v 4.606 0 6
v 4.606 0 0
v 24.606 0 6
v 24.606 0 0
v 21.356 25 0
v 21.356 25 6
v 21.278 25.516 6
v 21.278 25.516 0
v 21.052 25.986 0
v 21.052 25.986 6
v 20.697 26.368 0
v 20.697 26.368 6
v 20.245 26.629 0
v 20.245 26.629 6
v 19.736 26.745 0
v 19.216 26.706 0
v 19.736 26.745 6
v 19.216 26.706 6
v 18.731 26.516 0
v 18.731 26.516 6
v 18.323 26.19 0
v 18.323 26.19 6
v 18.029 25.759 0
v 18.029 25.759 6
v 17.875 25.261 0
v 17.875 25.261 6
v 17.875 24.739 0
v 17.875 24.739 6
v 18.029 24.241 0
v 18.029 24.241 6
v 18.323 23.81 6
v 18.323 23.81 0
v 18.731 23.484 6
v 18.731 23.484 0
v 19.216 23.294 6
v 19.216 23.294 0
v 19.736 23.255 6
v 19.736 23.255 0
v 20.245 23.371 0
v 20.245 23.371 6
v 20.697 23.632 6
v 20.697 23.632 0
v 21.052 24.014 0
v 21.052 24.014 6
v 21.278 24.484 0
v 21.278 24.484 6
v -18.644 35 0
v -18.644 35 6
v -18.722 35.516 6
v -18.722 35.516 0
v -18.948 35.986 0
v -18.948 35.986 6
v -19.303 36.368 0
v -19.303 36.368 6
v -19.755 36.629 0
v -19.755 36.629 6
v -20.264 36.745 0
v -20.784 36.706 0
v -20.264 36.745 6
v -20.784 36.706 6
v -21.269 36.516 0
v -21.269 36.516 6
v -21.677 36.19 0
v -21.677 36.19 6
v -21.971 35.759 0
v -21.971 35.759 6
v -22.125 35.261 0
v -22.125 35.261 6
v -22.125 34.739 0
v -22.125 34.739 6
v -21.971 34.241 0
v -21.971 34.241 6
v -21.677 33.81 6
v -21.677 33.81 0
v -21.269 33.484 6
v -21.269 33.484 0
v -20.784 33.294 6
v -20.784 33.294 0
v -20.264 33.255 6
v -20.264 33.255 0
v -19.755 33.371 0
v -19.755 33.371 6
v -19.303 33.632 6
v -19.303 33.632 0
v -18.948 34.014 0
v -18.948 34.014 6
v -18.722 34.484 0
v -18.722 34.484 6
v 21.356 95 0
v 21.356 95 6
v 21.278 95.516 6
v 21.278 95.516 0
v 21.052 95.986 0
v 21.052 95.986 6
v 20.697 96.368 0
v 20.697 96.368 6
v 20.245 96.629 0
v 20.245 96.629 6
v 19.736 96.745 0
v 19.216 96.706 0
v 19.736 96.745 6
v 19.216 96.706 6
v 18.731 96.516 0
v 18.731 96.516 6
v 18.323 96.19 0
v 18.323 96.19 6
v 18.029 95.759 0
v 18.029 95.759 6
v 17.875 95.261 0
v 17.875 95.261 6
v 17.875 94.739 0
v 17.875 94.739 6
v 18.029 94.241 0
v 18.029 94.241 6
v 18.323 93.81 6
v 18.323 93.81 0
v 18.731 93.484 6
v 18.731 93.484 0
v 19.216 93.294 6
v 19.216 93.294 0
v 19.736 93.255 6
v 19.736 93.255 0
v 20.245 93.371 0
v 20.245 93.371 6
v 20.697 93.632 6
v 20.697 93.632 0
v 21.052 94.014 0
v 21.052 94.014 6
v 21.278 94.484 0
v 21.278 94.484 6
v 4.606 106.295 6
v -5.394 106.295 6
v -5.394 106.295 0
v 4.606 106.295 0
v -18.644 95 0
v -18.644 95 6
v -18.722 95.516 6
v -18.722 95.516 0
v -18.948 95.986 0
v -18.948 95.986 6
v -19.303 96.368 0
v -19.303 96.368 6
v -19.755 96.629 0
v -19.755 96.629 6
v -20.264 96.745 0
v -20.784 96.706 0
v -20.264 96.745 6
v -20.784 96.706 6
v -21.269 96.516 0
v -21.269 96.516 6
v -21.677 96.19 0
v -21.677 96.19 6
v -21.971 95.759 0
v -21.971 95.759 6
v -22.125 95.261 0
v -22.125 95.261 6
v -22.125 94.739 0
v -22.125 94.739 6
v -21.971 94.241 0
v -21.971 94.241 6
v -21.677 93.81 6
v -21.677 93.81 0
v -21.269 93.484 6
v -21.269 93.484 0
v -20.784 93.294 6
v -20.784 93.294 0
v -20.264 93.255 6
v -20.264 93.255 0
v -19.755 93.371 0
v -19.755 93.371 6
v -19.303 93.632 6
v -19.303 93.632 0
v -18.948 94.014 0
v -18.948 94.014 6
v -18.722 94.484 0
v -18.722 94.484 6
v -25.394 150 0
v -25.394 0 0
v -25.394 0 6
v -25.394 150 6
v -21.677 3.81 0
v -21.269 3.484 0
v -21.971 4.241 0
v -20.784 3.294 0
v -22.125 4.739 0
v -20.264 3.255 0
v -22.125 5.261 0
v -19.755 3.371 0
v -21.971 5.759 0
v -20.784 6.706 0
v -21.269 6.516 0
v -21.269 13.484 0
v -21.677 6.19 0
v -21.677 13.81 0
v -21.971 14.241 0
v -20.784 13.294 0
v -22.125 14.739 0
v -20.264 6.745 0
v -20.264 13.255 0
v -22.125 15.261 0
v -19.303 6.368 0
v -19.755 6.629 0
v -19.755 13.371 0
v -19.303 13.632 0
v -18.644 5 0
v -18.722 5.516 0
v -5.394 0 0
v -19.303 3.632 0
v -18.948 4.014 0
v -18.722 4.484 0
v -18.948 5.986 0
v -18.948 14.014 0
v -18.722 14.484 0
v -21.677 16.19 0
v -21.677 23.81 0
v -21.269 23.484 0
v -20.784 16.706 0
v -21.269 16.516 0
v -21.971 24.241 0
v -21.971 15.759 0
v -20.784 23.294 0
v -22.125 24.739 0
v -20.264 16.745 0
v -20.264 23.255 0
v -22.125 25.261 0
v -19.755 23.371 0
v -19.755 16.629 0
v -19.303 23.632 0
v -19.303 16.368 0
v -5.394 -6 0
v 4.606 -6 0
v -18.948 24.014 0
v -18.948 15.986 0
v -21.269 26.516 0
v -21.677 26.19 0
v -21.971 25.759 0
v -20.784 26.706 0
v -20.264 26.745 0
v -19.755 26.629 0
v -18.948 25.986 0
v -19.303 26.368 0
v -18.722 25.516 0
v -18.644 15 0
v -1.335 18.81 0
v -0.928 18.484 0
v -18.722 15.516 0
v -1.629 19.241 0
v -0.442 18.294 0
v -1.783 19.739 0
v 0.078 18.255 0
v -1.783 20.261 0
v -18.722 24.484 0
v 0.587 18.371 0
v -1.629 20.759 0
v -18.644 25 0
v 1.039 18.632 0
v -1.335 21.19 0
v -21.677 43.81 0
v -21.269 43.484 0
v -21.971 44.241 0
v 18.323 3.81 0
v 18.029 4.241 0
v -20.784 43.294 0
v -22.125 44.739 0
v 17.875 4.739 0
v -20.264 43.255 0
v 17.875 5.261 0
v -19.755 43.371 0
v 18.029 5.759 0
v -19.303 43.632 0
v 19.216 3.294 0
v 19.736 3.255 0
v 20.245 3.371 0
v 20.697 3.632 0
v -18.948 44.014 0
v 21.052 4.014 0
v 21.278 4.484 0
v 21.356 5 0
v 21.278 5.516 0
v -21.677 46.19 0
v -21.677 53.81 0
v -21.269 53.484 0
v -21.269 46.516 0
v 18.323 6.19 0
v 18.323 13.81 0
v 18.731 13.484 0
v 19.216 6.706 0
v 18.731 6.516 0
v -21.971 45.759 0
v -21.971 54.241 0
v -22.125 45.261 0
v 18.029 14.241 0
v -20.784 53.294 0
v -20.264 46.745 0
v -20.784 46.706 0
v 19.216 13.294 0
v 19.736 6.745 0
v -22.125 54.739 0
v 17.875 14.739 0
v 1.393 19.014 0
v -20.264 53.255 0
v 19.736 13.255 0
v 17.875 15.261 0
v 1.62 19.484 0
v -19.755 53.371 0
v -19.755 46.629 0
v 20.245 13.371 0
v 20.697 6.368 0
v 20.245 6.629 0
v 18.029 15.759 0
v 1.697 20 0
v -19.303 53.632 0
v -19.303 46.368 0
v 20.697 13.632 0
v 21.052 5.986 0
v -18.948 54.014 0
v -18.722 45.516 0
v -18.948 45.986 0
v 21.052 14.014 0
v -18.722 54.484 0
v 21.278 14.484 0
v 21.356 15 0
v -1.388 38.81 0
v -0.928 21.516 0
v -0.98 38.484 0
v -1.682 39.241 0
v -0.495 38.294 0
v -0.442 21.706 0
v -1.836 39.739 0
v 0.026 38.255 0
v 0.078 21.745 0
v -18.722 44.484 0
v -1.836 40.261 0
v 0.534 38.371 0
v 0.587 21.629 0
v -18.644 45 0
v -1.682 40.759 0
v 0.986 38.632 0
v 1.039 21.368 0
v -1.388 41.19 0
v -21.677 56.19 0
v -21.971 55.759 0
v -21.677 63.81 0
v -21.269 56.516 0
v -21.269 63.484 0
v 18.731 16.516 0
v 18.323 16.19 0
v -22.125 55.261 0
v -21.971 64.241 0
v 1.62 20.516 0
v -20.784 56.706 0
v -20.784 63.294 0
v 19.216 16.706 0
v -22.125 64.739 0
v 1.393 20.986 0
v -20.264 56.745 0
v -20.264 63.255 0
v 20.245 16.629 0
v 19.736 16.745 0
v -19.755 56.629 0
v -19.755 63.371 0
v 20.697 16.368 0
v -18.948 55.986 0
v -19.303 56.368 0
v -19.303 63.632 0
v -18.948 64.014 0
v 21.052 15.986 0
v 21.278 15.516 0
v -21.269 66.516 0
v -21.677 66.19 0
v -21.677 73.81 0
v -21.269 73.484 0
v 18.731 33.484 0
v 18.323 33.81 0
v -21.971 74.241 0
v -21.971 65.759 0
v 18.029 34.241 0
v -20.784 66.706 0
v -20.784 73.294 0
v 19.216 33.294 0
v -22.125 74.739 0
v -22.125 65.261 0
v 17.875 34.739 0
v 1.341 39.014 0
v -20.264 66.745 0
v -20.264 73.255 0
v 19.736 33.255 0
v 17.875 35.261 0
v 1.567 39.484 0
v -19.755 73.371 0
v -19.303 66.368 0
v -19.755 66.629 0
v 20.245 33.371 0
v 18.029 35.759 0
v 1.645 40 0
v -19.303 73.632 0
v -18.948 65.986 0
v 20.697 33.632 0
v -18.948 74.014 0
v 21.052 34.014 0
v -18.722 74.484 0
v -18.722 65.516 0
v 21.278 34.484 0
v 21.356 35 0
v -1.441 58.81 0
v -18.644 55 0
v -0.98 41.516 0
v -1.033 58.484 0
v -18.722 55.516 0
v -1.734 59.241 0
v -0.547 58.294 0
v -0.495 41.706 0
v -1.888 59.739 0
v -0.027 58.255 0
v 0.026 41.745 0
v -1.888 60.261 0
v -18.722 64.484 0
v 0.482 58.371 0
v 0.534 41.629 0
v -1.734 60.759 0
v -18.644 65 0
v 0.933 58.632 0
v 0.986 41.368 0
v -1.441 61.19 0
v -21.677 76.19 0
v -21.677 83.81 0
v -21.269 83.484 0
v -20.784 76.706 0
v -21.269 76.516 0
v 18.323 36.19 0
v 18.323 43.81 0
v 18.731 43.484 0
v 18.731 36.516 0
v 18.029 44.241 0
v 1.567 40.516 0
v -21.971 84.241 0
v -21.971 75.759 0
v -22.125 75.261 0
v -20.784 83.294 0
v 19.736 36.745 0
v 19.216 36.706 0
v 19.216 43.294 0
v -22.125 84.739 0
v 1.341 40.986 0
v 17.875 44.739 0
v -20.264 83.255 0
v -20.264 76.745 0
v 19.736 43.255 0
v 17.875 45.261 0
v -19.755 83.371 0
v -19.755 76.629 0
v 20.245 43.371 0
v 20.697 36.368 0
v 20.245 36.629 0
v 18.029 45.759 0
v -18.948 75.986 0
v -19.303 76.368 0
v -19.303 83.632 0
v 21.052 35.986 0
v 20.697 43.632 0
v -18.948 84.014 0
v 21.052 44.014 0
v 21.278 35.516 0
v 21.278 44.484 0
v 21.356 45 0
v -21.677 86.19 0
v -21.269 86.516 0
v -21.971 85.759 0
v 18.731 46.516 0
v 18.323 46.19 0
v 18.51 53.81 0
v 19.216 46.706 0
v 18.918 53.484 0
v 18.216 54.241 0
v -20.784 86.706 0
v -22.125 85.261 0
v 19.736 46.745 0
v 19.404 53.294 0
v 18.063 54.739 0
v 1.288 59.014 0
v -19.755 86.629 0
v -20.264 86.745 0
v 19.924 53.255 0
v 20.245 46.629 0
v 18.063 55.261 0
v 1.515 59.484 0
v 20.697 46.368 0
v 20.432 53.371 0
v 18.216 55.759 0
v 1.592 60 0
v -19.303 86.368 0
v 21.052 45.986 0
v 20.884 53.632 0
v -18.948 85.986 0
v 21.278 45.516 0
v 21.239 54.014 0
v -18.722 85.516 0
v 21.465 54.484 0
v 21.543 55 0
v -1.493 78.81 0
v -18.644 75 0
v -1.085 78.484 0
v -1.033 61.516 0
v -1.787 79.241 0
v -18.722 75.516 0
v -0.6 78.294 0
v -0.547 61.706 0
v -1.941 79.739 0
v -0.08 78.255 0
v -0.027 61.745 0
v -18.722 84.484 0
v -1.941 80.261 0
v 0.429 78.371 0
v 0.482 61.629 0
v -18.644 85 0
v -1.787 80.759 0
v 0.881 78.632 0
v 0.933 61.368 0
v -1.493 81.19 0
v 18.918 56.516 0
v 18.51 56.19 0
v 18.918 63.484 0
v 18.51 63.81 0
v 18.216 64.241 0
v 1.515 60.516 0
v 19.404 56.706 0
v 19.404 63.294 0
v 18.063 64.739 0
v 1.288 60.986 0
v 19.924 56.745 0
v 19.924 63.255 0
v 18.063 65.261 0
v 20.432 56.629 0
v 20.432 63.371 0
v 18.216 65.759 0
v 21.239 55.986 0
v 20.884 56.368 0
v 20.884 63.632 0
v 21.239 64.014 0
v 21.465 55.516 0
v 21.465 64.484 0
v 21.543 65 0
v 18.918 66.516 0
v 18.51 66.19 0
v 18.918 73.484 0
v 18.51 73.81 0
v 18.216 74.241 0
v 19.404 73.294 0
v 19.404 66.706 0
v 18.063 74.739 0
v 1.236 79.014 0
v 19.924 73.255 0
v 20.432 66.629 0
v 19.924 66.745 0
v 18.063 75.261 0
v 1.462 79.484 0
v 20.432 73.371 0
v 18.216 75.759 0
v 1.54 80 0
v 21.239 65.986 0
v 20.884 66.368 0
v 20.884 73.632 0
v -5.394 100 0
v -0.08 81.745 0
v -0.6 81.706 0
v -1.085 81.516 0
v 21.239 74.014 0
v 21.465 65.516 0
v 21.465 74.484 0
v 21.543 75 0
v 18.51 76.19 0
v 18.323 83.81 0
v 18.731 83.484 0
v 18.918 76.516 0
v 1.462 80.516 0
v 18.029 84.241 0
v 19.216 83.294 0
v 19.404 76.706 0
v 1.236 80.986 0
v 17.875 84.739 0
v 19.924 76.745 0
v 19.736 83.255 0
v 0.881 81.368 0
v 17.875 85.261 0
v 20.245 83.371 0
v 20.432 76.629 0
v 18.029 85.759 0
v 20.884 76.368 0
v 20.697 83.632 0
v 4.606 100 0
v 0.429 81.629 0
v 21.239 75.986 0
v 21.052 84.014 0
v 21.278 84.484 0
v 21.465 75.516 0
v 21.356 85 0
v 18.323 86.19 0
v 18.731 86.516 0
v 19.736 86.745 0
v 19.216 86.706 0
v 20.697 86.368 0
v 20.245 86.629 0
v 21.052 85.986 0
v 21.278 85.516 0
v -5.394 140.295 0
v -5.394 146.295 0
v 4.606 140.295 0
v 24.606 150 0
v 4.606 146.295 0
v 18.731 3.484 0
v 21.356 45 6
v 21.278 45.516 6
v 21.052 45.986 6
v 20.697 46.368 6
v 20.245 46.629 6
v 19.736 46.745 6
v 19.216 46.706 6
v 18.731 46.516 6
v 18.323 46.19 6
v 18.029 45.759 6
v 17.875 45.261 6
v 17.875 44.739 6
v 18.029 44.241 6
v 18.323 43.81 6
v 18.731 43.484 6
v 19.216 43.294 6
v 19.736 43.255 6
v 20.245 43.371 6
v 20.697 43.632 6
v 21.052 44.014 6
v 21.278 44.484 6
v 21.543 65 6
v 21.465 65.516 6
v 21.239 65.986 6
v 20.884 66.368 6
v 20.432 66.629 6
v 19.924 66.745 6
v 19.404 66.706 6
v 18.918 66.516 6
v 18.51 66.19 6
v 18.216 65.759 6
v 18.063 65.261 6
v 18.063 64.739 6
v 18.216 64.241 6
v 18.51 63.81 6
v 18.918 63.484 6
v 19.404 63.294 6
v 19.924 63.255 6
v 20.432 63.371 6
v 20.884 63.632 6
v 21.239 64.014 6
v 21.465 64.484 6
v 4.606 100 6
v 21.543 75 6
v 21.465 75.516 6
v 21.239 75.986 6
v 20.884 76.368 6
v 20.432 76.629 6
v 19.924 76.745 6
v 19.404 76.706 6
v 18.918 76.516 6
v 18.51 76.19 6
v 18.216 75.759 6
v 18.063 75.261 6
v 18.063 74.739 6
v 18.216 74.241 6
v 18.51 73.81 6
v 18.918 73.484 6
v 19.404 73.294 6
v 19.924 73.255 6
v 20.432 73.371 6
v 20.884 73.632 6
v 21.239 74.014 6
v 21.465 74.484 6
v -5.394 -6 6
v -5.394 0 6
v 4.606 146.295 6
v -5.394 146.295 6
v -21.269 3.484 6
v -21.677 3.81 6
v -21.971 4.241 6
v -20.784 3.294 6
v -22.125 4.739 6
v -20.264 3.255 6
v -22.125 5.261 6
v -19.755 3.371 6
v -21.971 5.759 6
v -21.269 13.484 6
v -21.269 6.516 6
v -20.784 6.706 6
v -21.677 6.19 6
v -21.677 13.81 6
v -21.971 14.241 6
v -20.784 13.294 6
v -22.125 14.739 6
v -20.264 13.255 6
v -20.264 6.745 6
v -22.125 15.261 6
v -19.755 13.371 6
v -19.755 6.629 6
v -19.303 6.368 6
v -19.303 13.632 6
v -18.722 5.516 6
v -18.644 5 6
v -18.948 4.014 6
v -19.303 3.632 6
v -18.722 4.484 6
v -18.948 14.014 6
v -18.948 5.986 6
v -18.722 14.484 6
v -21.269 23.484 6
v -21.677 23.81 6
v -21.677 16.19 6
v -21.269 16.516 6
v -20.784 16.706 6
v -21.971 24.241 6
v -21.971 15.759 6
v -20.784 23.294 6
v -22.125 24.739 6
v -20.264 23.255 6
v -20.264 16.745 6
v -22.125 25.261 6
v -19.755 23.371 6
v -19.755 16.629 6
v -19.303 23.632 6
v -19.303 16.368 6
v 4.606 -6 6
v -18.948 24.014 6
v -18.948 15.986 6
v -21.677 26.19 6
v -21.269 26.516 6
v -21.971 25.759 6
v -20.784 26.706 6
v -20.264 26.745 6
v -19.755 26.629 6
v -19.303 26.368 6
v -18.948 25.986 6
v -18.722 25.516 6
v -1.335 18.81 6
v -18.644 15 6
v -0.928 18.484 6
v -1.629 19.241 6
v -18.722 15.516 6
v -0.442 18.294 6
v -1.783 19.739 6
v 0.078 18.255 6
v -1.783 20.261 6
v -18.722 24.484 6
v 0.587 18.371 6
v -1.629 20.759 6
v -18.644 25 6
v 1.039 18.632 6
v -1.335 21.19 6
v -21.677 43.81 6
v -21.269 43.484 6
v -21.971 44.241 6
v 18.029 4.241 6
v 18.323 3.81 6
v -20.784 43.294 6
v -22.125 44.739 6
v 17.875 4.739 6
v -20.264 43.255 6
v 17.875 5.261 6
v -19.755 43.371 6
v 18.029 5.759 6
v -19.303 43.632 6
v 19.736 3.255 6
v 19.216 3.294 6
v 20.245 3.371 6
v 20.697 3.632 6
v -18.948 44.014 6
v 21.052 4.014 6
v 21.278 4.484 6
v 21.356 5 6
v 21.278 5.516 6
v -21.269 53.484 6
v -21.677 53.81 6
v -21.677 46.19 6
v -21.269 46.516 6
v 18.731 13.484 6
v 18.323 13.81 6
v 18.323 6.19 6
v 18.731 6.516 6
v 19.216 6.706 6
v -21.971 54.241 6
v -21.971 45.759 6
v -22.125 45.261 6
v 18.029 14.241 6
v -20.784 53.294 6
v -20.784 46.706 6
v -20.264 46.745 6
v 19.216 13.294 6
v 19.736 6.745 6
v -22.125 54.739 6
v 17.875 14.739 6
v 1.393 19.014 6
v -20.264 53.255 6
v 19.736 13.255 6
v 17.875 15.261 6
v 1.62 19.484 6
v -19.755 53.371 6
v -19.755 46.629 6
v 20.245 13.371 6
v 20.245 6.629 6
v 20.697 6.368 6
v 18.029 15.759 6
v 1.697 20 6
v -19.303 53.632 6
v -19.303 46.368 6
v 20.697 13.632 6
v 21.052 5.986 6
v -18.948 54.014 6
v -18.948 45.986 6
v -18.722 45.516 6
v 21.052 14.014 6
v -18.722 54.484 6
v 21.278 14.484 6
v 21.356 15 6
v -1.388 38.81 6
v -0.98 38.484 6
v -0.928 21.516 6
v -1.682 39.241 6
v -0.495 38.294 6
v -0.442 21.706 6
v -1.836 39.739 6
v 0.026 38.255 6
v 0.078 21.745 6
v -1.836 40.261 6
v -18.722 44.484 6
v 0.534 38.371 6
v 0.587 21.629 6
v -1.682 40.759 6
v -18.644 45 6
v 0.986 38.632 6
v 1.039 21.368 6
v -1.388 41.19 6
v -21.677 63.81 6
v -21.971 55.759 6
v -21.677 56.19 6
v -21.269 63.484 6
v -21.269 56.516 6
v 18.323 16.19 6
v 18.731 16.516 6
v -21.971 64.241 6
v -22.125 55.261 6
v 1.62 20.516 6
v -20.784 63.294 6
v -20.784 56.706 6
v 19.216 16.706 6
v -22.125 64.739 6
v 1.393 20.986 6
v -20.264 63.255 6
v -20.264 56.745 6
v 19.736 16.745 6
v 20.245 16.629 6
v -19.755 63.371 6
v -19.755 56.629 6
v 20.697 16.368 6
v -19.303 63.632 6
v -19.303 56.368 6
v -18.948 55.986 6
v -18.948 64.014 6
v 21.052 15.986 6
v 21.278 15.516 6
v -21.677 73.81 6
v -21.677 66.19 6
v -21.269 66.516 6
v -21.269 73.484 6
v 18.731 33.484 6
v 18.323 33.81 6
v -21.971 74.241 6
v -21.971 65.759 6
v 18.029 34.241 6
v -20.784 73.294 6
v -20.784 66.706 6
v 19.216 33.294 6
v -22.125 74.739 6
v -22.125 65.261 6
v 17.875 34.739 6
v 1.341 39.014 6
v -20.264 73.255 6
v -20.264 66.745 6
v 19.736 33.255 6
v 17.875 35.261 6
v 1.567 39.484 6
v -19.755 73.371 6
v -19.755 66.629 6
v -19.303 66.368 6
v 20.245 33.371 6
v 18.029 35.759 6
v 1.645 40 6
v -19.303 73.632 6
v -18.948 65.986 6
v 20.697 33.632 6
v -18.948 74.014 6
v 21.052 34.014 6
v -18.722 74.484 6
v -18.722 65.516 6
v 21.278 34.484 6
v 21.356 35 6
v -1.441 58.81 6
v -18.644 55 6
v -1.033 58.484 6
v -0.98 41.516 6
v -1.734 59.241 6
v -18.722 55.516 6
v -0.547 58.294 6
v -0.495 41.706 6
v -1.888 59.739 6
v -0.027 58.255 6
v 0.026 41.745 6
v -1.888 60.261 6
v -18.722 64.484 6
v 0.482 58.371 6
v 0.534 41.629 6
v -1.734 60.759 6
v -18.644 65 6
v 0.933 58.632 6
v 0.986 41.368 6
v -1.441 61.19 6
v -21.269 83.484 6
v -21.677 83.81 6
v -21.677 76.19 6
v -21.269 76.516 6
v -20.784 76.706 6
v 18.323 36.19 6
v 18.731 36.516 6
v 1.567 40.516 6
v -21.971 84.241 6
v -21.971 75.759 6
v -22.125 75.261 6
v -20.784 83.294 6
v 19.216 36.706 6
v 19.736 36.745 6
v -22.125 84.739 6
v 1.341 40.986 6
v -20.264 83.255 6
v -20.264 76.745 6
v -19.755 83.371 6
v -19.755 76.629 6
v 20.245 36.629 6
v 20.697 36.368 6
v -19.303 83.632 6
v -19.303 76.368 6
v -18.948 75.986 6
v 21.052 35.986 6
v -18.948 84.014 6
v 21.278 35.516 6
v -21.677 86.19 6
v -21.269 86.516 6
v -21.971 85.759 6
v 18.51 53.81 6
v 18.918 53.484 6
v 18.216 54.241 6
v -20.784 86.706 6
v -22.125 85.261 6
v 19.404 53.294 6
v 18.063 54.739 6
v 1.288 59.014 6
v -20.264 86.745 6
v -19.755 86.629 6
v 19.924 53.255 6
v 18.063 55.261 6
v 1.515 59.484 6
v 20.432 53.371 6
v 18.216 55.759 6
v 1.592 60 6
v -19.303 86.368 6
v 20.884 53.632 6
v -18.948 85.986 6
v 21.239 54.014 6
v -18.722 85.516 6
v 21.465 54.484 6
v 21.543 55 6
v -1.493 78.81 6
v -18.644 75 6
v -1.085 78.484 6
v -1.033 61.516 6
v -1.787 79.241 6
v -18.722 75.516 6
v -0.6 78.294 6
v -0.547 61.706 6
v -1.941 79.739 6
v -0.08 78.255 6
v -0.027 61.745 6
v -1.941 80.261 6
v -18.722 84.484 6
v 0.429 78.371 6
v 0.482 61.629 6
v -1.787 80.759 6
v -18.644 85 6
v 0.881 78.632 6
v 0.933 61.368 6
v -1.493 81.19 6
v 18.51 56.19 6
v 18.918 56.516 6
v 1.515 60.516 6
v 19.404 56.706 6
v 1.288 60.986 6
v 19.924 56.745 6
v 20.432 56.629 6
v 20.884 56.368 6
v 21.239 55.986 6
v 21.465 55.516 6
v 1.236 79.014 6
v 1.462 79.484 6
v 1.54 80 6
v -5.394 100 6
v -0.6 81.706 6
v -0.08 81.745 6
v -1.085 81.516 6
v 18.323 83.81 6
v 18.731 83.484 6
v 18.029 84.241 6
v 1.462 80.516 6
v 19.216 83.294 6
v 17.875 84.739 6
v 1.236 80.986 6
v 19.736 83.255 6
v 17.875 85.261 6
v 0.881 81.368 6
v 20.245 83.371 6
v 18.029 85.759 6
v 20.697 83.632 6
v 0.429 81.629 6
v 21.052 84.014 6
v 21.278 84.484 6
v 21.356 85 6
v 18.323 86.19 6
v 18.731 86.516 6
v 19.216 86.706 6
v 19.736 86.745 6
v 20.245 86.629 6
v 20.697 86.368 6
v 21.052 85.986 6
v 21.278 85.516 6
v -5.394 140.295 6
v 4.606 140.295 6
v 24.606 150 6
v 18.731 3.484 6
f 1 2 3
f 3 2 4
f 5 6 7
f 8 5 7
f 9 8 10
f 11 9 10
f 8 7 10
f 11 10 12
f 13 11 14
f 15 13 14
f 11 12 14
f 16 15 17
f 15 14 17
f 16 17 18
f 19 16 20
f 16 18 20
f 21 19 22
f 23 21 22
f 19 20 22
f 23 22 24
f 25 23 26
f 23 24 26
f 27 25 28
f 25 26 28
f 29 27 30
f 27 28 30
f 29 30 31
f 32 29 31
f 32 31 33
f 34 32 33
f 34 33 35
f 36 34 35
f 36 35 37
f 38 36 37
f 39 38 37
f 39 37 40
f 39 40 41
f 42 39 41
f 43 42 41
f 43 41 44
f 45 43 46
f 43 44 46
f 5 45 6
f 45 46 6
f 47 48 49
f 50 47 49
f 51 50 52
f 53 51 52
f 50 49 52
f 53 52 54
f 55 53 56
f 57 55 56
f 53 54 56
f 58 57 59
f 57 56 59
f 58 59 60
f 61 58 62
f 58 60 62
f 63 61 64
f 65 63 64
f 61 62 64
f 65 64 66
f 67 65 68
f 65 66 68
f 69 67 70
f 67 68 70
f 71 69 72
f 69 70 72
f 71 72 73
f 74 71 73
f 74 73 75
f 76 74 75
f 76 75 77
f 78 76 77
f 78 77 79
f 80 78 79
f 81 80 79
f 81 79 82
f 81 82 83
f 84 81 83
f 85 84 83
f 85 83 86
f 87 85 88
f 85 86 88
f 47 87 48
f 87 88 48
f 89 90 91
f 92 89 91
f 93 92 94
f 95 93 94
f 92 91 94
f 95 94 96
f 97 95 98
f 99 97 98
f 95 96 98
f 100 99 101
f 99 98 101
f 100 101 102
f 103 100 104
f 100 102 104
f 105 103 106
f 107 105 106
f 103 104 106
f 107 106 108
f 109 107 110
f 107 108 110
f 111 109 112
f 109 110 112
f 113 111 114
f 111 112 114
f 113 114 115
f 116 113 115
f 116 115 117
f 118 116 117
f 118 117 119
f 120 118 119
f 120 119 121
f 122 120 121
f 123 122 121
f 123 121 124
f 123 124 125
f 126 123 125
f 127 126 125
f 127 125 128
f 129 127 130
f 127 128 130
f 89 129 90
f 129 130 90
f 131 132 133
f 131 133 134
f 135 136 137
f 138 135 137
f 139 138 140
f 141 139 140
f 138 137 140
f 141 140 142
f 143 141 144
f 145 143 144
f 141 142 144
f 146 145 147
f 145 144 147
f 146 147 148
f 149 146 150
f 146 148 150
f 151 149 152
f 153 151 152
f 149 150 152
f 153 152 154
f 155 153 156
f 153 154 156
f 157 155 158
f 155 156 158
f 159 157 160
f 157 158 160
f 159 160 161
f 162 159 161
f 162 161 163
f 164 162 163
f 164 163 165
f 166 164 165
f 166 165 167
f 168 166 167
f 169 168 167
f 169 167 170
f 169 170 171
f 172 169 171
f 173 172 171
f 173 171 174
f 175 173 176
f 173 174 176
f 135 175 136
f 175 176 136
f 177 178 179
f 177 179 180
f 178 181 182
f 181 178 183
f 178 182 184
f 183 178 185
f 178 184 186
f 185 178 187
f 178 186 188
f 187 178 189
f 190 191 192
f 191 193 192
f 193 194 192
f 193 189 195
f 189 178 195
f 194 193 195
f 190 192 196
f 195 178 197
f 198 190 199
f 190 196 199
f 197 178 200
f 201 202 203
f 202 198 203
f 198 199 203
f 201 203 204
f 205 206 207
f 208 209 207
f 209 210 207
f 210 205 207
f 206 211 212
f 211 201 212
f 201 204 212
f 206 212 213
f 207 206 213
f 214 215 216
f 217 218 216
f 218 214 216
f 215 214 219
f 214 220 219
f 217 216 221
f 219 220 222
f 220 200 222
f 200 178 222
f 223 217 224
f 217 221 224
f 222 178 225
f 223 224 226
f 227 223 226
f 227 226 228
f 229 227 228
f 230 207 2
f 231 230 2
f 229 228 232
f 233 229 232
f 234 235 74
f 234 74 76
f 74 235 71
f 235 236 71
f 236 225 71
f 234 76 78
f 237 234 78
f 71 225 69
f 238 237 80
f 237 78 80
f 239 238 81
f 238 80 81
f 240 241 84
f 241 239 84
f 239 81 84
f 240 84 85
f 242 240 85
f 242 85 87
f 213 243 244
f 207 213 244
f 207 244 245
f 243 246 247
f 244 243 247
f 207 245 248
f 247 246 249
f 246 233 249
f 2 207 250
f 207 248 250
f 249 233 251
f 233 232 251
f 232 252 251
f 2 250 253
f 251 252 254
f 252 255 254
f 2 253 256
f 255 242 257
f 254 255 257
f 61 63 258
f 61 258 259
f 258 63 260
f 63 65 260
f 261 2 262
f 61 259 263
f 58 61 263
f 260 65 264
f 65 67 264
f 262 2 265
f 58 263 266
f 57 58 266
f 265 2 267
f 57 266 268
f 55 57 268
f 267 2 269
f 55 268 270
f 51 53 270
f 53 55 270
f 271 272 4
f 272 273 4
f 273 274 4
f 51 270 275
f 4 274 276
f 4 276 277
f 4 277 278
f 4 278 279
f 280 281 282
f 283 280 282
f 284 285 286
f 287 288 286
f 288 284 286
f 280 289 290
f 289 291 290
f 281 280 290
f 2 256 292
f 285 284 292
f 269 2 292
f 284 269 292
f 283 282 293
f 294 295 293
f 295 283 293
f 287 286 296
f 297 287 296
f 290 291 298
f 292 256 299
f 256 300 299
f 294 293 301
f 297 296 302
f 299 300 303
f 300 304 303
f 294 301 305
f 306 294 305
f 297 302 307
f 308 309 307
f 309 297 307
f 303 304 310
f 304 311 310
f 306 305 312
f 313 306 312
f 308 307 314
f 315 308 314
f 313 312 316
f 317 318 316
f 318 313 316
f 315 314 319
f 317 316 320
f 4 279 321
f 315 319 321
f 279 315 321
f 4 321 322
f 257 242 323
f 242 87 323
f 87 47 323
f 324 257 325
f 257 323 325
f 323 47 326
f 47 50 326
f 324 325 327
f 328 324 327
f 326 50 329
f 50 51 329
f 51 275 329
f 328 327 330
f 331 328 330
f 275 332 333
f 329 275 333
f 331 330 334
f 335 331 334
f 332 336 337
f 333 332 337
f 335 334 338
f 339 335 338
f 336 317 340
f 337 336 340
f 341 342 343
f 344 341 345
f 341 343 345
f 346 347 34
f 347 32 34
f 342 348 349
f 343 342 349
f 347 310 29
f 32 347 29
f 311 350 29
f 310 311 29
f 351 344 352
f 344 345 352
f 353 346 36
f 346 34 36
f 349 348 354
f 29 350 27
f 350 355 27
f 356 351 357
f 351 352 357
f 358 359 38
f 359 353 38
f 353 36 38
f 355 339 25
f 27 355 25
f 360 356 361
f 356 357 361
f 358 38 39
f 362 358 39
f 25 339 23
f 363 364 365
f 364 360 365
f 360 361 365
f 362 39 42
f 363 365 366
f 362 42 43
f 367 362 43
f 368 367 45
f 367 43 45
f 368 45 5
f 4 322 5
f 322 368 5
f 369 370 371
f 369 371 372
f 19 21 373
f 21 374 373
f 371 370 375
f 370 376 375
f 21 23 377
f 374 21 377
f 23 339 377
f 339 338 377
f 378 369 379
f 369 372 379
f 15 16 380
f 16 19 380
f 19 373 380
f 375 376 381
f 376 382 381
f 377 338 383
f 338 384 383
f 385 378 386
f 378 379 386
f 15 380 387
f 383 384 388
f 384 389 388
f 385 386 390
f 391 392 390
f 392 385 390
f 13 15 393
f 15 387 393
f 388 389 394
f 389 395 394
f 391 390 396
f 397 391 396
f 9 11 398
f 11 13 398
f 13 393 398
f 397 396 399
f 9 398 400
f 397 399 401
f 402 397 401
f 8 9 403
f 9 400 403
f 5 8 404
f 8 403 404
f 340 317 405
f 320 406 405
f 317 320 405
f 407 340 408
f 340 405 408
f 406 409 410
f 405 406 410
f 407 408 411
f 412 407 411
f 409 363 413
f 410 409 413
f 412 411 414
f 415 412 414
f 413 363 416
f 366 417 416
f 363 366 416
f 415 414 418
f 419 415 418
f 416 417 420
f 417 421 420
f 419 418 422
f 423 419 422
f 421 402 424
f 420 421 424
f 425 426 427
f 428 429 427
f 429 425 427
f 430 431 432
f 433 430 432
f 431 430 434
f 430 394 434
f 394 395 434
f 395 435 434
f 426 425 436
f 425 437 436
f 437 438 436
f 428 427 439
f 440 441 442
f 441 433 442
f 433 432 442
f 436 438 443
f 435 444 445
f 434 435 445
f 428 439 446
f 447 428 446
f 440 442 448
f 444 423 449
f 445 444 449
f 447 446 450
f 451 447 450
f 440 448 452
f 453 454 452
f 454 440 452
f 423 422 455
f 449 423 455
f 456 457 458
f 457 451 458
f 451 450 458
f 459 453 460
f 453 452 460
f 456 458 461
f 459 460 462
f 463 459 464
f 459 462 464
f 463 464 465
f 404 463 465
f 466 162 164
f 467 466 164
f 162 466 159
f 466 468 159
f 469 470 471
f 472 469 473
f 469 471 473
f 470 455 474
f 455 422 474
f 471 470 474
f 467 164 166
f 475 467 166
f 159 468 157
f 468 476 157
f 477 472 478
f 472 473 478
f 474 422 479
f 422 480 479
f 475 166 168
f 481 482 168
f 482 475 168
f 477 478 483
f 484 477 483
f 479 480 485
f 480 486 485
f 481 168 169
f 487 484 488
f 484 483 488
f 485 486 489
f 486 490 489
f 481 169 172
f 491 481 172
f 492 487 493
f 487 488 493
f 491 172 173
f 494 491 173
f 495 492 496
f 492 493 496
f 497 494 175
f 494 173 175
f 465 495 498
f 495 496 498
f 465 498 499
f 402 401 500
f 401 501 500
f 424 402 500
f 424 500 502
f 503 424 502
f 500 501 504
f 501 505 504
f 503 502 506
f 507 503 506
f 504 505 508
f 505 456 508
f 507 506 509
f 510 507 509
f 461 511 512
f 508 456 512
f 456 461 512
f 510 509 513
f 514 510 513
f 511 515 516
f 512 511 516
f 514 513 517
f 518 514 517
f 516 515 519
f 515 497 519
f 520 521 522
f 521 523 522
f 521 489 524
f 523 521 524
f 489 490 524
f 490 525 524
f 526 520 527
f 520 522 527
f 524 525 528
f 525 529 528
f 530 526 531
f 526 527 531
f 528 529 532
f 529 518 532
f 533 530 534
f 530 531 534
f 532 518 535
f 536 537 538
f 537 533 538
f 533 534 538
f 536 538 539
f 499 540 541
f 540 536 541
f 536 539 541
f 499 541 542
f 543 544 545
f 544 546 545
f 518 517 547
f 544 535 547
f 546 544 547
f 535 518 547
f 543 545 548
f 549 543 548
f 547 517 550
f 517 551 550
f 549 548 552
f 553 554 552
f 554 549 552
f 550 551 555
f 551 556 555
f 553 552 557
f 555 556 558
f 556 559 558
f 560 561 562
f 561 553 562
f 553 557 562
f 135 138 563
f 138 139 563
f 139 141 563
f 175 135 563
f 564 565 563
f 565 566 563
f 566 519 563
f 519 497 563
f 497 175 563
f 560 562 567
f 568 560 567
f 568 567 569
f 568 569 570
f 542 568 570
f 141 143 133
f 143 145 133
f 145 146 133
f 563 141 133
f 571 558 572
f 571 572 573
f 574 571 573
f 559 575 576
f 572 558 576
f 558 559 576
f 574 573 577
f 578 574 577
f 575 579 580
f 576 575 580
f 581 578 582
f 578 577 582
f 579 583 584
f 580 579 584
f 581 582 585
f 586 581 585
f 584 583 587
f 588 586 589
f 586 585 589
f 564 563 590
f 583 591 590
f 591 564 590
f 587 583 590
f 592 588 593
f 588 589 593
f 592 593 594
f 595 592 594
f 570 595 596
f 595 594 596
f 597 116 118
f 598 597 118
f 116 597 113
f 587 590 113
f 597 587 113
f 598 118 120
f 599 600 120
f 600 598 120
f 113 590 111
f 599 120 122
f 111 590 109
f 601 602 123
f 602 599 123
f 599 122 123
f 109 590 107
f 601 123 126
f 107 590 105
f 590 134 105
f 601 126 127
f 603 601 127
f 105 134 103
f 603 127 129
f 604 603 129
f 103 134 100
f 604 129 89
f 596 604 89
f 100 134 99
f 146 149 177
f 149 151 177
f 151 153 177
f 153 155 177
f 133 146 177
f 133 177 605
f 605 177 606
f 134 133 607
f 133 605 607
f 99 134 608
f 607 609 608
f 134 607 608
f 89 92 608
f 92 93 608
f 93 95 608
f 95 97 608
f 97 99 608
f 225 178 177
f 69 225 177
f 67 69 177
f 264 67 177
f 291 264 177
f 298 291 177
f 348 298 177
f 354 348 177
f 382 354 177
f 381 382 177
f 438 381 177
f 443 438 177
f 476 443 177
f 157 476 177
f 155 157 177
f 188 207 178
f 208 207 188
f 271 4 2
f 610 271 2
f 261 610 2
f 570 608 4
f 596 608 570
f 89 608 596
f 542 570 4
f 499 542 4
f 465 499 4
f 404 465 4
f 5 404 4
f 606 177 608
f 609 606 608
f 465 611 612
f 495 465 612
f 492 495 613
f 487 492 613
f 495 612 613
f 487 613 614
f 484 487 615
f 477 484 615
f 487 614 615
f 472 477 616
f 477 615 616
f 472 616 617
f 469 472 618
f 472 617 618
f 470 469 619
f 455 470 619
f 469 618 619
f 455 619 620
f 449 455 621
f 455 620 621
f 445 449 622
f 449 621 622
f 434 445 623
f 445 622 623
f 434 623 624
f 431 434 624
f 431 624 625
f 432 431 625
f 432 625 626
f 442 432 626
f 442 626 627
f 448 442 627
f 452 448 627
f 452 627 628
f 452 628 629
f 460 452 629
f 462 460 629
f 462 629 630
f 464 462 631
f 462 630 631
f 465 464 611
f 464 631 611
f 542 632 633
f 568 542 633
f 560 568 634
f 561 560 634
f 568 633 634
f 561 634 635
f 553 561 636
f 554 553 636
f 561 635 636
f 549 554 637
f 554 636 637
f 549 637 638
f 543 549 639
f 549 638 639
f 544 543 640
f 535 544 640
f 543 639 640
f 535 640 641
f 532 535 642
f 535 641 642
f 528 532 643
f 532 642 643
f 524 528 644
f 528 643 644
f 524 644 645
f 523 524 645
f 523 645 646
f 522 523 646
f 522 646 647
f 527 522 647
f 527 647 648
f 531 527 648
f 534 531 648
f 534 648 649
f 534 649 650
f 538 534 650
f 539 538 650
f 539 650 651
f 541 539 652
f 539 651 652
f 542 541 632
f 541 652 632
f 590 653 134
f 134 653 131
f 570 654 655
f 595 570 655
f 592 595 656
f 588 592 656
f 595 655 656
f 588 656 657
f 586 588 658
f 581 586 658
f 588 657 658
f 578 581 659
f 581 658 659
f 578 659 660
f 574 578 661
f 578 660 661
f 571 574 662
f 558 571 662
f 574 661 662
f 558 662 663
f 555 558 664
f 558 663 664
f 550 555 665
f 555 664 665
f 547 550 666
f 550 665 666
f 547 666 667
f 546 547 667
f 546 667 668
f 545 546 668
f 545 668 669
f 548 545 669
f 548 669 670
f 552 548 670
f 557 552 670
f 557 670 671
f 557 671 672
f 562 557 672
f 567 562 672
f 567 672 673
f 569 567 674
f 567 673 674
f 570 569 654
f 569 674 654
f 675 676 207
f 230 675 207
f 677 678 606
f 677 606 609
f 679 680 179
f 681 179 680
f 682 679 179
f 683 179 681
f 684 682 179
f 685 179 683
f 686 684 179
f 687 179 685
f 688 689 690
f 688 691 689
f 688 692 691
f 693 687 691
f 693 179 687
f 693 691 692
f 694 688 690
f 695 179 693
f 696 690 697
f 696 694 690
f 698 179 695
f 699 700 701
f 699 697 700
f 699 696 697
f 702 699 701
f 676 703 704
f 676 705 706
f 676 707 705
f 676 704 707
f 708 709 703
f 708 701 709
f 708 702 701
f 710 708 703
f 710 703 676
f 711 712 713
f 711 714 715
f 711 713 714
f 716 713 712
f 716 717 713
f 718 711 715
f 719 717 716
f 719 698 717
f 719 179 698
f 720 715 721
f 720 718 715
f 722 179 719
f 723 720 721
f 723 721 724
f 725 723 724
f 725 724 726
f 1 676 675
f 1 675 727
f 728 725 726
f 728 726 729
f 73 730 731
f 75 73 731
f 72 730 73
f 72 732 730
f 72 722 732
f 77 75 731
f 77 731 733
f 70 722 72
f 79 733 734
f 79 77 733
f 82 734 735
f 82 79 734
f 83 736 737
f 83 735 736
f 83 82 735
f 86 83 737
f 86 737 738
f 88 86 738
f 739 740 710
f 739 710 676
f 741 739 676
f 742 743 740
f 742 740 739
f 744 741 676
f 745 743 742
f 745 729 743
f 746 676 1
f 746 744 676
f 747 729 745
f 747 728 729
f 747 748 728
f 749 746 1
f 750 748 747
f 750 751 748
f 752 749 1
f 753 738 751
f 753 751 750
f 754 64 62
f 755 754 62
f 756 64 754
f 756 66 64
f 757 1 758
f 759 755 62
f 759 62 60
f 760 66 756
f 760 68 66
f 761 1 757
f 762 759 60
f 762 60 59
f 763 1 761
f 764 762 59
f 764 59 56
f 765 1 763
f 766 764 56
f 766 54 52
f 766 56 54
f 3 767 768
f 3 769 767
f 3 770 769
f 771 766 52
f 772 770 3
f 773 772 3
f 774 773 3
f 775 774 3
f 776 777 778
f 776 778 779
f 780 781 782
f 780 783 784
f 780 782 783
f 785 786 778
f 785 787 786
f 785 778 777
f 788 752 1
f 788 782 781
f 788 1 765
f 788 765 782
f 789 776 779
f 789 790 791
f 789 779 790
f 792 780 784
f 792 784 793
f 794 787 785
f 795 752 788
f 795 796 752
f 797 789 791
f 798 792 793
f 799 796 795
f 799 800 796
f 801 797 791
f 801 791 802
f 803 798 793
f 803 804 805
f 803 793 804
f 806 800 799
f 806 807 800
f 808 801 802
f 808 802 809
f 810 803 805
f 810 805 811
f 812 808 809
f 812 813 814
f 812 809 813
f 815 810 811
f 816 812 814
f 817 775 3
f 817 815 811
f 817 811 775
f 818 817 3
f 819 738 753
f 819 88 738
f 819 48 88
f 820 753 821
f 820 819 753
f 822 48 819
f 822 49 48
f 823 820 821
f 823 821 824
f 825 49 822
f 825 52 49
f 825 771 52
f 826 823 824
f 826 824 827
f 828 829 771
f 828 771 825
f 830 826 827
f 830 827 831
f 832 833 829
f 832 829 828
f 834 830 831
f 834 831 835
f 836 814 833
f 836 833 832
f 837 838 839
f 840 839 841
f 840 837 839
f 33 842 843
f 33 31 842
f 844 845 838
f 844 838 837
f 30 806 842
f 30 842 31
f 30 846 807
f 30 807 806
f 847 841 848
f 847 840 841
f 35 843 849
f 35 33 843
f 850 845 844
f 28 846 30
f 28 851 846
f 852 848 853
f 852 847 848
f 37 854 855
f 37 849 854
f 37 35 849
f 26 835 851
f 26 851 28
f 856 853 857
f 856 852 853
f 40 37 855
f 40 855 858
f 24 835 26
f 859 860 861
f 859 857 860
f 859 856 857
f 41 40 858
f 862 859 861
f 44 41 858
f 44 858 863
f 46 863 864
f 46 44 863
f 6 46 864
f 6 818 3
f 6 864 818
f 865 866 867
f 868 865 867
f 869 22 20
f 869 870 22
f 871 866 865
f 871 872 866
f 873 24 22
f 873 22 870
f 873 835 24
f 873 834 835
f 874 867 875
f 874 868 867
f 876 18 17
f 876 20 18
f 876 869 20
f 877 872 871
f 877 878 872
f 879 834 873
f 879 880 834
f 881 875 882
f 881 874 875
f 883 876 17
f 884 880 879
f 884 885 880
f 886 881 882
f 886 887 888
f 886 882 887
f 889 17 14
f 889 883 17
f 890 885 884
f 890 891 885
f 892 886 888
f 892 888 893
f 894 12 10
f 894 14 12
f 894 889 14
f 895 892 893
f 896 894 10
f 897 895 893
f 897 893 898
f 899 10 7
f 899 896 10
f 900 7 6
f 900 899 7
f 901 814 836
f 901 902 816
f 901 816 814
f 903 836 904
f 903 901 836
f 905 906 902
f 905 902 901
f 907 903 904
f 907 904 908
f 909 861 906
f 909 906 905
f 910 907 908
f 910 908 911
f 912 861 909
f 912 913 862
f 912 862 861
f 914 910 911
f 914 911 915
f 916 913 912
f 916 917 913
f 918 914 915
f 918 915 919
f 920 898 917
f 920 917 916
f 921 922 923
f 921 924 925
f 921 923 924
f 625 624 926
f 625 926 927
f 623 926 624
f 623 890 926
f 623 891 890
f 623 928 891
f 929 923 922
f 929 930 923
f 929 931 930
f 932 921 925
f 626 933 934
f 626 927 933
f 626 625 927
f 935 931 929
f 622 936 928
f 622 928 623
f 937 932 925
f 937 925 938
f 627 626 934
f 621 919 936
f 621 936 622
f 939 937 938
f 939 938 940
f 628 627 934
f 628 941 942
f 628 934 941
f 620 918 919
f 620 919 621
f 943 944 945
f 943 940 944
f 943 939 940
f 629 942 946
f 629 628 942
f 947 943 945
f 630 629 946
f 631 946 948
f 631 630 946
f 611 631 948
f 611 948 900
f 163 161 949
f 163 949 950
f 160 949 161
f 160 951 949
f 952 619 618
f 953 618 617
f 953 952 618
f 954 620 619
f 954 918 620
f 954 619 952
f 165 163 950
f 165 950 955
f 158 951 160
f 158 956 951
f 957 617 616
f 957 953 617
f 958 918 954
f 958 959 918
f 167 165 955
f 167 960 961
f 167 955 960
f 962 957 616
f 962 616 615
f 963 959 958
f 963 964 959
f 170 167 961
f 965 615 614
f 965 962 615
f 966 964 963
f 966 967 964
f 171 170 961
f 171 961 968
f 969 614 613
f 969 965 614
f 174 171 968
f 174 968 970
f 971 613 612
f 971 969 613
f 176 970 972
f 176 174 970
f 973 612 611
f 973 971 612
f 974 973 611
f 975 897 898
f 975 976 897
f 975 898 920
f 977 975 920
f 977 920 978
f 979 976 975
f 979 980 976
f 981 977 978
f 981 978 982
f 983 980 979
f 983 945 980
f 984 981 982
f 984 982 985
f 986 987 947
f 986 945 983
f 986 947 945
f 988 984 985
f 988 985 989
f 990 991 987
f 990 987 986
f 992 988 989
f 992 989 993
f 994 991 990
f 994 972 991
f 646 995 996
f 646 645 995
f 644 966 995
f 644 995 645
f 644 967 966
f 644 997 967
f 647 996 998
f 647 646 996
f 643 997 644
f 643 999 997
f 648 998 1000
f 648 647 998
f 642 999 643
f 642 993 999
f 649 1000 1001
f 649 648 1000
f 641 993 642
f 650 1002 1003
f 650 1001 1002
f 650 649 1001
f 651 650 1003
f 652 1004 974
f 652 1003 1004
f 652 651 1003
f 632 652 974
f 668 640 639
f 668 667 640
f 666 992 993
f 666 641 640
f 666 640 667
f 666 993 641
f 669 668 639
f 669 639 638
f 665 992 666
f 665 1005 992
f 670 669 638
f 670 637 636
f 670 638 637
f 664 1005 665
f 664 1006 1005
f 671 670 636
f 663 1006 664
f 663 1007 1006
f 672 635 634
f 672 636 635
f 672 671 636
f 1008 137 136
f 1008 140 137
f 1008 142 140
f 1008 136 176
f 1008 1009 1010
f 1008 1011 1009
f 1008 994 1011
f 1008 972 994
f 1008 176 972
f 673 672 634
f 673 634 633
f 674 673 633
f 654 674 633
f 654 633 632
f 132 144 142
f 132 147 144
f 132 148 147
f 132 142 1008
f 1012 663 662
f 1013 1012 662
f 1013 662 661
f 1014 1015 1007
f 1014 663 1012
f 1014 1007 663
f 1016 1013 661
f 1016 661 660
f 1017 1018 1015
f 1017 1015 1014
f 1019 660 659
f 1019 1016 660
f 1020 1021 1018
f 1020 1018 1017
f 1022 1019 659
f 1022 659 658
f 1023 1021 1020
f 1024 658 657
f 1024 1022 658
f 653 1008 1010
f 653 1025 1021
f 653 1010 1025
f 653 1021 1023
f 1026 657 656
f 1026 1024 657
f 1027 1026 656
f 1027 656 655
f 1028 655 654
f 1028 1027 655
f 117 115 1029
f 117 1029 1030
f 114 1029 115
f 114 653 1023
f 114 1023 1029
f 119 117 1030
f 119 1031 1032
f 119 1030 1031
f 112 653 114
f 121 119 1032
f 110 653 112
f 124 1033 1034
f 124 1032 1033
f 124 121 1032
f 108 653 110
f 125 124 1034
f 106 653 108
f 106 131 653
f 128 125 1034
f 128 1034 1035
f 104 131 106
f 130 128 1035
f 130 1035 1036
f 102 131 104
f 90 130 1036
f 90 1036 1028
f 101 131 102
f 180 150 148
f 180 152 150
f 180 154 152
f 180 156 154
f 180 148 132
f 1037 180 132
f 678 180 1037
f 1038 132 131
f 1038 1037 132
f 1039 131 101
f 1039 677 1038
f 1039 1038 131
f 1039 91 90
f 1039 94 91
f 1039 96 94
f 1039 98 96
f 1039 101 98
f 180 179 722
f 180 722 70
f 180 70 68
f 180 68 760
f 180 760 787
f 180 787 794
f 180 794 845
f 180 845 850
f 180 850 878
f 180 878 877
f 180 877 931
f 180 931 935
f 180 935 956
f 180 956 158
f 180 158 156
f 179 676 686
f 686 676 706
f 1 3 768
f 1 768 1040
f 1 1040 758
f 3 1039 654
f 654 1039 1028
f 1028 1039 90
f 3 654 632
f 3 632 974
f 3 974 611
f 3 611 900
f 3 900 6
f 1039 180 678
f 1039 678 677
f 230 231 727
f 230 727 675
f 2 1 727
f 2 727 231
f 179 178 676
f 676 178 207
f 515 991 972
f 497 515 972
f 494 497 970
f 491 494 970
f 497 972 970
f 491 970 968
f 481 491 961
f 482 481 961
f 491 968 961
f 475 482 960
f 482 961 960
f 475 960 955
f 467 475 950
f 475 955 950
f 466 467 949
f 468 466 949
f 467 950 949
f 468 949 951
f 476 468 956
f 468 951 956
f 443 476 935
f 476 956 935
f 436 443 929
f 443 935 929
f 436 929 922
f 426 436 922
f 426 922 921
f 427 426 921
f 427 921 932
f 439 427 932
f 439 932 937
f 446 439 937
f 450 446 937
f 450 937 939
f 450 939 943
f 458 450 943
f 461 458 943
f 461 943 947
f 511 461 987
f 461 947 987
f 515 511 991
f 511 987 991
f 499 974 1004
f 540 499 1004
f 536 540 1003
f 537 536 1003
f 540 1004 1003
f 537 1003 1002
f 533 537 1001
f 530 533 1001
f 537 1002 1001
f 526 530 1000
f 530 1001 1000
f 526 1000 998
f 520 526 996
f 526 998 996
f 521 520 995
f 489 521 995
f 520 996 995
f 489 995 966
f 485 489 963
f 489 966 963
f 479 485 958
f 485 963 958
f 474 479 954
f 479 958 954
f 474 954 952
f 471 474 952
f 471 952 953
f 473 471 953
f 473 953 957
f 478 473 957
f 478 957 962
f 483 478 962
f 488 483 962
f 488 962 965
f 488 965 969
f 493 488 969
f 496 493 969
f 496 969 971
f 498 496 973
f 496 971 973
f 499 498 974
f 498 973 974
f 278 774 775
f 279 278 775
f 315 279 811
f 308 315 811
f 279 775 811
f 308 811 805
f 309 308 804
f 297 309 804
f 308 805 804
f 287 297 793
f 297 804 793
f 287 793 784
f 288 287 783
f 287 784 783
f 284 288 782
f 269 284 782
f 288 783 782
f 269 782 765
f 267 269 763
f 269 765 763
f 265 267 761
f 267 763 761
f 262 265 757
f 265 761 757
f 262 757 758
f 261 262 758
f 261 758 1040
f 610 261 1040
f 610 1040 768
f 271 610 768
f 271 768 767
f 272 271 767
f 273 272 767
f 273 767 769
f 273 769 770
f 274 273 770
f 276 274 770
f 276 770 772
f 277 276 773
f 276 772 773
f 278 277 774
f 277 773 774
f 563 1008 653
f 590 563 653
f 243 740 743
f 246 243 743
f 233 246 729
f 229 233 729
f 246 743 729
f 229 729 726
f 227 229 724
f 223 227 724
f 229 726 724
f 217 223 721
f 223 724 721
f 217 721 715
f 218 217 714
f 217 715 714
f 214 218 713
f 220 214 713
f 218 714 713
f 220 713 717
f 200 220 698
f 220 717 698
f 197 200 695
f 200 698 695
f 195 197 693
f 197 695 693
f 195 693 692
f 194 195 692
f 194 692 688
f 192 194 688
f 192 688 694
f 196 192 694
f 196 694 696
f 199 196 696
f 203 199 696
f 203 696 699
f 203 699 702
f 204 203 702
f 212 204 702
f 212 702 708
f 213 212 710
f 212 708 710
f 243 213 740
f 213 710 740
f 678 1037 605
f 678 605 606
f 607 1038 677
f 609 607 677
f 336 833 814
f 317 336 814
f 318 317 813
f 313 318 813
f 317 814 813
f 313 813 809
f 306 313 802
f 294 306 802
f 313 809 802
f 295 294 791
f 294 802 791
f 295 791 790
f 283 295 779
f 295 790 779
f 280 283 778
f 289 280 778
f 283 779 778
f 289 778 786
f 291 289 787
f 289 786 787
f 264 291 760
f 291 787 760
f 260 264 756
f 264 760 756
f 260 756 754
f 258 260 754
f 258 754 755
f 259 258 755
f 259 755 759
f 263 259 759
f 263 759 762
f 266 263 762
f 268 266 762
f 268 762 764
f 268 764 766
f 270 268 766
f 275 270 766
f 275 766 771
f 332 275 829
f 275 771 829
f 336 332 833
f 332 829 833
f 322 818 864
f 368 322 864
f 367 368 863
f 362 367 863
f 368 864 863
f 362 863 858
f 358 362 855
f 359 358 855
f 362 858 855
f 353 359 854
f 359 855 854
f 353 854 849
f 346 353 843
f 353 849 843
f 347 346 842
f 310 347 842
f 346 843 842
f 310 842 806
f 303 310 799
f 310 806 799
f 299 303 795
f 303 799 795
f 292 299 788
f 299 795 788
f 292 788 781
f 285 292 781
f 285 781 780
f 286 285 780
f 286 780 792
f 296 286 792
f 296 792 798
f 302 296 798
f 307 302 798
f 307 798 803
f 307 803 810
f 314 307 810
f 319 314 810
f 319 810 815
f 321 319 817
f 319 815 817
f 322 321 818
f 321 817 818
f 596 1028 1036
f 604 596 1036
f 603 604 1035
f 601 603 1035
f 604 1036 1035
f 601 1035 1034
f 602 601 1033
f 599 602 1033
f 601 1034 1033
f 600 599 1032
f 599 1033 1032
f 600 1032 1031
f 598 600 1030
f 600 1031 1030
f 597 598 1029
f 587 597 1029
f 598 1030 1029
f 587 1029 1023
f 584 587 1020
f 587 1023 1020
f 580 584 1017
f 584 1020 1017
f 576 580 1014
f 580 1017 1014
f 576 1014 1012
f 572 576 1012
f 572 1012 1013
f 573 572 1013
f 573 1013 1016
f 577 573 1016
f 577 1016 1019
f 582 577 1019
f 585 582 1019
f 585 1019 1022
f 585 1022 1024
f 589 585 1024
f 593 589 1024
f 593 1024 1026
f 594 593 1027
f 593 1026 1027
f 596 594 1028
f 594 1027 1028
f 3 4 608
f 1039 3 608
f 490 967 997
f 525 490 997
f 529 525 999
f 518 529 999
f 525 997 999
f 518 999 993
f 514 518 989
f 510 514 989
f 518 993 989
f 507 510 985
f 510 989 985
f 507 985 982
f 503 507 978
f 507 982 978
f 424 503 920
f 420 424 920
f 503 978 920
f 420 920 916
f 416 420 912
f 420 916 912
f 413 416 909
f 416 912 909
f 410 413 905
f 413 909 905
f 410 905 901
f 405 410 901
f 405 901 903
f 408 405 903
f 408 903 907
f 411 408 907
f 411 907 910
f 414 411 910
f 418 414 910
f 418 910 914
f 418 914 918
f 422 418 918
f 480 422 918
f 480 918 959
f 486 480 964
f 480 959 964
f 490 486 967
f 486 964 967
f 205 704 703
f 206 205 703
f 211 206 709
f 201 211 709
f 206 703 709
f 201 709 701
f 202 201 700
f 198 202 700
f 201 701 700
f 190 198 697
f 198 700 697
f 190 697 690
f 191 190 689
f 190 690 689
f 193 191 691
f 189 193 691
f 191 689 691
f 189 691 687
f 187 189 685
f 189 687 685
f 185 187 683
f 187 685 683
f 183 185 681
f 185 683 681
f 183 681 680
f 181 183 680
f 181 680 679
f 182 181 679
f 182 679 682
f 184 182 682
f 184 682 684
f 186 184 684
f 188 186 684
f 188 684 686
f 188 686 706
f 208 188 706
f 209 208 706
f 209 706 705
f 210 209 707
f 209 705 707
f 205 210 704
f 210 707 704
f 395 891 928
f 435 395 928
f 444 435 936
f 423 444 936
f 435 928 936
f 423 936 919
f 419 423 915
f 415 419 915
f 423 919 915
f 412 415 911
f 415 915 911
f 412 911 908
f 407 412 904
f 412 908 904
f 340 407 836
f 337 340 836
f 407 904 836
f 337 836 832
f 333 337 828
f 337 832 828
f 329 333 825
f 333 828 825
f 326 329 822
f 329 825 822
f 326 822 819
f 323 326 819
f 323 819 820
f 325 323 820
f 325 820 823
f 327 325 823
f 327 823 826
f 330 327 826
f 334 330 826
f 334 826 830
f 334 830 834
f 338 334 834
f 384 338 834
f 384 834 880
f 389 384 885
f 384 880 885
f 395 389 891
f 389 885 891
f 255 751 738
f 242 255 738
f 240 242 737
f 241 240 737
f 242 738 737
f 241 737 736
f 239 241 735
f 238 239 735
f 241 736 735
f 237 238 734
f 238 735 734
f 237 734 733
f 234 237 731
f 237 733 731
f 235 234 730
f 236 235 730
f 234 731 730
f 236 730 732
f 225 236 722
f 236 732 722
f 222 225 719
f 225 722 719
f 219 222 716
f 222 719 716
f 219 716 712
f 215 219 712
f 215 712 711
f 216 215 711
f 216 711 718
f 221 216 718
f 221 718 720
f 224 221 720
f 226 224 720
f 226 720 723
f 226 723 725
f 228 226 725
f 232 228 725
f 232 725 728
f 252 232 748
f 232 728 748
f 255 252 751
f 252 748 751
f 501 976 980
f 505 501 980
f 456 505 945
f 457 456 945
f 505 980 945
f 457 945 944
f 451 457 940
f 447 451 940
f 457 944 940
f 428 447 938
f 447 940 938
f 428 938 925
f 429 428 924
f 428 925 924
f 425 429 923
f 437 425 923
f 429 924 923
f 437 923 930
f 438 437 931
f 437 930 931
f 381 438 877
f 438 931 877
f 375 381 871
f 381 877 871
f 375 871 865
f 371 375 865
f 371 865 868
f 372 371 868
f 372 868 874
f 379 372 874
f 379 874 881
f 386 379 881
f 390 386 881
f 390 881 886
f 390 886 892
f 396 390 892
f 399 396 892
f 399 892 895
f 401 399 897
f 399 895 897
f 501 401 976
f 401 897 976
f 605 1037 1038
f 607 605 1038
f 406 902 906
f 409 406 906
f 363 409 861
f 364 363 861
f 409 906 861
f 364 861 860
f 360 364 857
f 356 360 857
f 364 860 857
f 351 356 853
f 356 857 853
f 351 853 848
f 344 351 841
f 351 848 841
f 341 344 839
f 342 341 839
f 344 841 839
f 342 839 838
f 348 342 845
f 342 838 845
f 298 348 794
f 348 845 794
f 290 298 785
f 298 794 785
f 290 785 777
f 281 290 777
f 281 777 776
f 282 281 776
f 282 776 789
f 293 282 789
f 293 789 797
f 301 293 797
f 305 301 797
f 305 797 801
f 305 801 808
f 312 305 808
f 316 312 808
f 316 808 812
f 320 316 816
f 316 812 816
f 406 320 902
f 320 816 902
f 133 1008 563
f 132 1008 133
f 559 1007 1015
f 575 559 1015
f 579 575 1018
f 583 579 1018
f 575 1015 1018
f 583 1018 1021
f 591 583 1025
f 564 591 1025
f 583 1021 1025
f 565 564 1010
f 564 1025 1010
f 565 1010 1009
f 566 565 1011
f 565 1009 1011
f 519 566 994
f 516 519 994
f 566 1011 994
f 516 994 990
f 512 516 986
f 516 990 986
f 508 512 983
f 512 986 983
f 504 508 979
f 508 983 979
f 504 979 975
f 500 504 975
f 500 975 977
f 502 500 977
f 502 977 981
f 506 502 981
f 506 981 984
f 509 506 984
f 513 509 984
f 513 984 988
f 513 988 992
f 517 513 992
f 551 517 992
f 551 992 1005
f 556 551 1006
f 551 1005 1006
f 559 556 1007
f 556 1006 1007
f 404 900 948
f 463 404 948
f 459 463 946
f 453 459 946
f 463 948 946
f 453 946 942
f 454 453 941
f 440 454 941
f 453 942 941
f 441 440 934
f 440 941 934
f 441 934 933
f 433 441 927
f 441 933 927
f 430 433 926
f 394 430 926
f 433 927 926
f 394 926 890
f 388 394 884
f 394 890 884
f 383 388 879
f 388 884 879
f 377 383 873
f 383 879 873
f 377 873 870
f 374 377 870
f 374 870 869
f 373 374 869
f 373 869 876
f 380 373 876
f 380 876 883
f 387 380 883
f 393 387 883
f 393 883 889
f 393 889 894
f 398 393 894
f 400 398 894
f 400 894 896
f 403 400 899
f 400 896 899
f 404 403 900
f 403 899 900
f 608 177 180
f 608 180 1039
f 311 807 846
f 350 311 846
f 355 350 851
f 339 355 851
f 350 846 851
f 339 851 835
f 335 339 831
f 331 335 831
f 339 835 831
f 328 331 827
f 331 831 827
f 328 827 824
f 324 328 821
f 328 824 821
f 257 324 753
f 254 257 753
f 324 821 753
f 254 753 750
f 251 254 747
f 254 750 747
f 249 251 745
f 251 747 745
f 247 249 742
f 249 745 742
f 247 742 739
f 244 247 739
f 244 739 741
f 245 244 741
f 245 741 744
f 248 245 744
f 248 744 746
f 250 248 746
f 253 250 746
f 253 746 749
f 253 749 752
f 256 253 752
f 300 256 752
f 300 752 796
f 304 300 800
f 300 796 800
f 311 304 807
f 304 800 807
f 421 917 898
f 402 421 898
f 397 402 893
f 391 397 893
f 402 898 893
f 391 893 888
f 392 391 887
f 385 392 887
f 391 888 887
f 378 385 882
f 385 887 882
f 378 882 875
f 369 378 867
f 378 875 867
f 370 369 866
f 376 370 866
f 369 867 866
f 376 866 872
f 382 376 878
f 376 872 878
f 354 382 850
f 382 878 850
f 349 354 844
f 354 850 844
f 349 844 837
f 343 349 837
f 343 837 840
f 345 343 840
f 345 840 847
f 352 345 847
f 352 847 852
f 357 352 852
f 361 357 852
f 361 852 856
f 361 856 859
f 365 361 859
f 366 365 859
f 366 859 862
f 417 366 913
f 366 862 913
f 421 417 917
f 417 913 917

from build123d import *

# Parameters (mm, degrees)
ESBO_O1_W                = 50
ESBO_O1_H                = 150
RESSALTO_EXTRUS_O1_DEPTH = 6
ESBO_O2_R                = 1.75
CORTE_EXTRUS_O1_DEPTH    = 6
ESBO_O3_W                = 10
ESBO_O3_H                = 6
RESSALTO_EXTRUS_O2_DEPTH = 6
ESBO_O4_W                = 10
ESBO_O4_H                = 6.295380903
CORTE_EXTRUS_O2_DEPTH    = 6
ESBO_O5_W                = 10
ESBO_O5_H                = 6
CORTE_EXTRUS_O3_DEPTH    = 6


with BuildPart() as part:
    # Esboço1 → Ressalto-extrusão1 (new body)
    with BuildSketch(Plane.XY):
        with Locations((-0.394283087, 75)):
            Rectangle(ESBO_O1_W, ESBO_O1_H)
    extrude(amount=RESSALTO_EXTRUS_O1_DEPTH)

    # Esboço2 → Corte-extrusão1 (cut)
    with BuildSketch(Plane.XY.offset(6)):
        with Locations((-20.394283087, 95)):
            Circle(ESBO_O2_R)
        with Locations((-20.394283087, 85)):
            Circle(ESBO_O2_R)
        with Locations((-20.394283087, 75)):
            Circle(ESBO_O2_R)
        with Locations((-20.394283087, 65)):
            Circle(ESBO_O2_R)
        with Locations((-20.394283087, 55)):
            Circle(ESBO_O2_R)
        with Locations((-20.394283087, 45)):
            Circle(ESBO_O2_R)
        with Locations((-20.394283087, 35)):
            Circle(ESBO_O2_R)
        with Locations((-20.394283087, 25)):
            Circle(ESBO_O2_R)
        with Locations((-20.394283087, 15)):
            Circle(ESBO_O2_R)
        with Locations((-20.394283087, 5)):
            Circle(ESBO_O2_R)
        with Locations((19.605716913, 95)):
            Circle(ESBO_O2_R)
        with Locations((19.605716913, 85)):
            Circle(ESBO_O2_R)
        with Locations((19.793101921, 75)):
            Circle(ESBO_O2_R)
        with Locations((19.793101921, 65)):
            Circle(ESBO_O2_R)
        with Locations((19.793101921, 55)):
            Circle(ESBO_O2_R)
        with Locations((19.605716913, 45)):
            Circle(ESBO_O2_R)
        with Locations((19.605716913, 35)):
            Circle(ESBO_O2_R)
        with Locations((19.605716913, 25)):
            Circle(ESBO_O2_R)
        with Locations((19.605716913, 15)):
            Circle(ESBO_O2_R)
        with Locations((19.605716913, 5)):
            Circle(ESBO_O2_R)
        with Locations((-0.052571078, 20)):
            Circle(ESBO_O2_R)
        with Locations((-0.210284313, 80)):
            Circle(ESBO_O2_R)
        with Locations((-0.105142156, 40)):
            Circle(ESBO_O2_R)
        with Locations((-0.157713235, 60)):
            Circle(ESBO_O2_R)
    extrude(amount=-CORTE_EXTRUS_O1_DEPTH, mode=Mode.SUBTRACT)

    # Esboço3 → Ressalto-extrusão2 (add)
    with BuildSketch(Plane(origin=(0, 0, 0), x_dir=(-1, 0, 0), z_dir=(0, -1, 0))):
        with Locations((0.394283087, -3)):
            Rectangle(ESBO_O3_W, ESBO_O3_H)
    extrude(amount=RESSALTO_EXTRUS_O2_DEPTH)

    # Esboço4 → Corte-extrusão2 (cut)
    with BuildSketch(Plane.XY.offset(6)):
        with Locations((-0.394283087, 103.147690452)):
            Rectangle(ESBO_O4_W, ESBO_O4_H)
    extrude(amount=-CORTE_EXTRUS_O2_DEPTH, mode=Mode.SUBTRACT)

    # Esboço5 → Corte-extrusão3 (cut)
    with BuildSketch(Plane.XY.offset(6)):
        with Locations((-0.394283087, 143.295380903)):
            Rectangle(ESBO_O5_W, ESBO_O5_H)
    extrude(amount=-CORTE_EXTRUS_O3_DEPTH, mode=Mode.SUBTRACT)


solid = part.part
